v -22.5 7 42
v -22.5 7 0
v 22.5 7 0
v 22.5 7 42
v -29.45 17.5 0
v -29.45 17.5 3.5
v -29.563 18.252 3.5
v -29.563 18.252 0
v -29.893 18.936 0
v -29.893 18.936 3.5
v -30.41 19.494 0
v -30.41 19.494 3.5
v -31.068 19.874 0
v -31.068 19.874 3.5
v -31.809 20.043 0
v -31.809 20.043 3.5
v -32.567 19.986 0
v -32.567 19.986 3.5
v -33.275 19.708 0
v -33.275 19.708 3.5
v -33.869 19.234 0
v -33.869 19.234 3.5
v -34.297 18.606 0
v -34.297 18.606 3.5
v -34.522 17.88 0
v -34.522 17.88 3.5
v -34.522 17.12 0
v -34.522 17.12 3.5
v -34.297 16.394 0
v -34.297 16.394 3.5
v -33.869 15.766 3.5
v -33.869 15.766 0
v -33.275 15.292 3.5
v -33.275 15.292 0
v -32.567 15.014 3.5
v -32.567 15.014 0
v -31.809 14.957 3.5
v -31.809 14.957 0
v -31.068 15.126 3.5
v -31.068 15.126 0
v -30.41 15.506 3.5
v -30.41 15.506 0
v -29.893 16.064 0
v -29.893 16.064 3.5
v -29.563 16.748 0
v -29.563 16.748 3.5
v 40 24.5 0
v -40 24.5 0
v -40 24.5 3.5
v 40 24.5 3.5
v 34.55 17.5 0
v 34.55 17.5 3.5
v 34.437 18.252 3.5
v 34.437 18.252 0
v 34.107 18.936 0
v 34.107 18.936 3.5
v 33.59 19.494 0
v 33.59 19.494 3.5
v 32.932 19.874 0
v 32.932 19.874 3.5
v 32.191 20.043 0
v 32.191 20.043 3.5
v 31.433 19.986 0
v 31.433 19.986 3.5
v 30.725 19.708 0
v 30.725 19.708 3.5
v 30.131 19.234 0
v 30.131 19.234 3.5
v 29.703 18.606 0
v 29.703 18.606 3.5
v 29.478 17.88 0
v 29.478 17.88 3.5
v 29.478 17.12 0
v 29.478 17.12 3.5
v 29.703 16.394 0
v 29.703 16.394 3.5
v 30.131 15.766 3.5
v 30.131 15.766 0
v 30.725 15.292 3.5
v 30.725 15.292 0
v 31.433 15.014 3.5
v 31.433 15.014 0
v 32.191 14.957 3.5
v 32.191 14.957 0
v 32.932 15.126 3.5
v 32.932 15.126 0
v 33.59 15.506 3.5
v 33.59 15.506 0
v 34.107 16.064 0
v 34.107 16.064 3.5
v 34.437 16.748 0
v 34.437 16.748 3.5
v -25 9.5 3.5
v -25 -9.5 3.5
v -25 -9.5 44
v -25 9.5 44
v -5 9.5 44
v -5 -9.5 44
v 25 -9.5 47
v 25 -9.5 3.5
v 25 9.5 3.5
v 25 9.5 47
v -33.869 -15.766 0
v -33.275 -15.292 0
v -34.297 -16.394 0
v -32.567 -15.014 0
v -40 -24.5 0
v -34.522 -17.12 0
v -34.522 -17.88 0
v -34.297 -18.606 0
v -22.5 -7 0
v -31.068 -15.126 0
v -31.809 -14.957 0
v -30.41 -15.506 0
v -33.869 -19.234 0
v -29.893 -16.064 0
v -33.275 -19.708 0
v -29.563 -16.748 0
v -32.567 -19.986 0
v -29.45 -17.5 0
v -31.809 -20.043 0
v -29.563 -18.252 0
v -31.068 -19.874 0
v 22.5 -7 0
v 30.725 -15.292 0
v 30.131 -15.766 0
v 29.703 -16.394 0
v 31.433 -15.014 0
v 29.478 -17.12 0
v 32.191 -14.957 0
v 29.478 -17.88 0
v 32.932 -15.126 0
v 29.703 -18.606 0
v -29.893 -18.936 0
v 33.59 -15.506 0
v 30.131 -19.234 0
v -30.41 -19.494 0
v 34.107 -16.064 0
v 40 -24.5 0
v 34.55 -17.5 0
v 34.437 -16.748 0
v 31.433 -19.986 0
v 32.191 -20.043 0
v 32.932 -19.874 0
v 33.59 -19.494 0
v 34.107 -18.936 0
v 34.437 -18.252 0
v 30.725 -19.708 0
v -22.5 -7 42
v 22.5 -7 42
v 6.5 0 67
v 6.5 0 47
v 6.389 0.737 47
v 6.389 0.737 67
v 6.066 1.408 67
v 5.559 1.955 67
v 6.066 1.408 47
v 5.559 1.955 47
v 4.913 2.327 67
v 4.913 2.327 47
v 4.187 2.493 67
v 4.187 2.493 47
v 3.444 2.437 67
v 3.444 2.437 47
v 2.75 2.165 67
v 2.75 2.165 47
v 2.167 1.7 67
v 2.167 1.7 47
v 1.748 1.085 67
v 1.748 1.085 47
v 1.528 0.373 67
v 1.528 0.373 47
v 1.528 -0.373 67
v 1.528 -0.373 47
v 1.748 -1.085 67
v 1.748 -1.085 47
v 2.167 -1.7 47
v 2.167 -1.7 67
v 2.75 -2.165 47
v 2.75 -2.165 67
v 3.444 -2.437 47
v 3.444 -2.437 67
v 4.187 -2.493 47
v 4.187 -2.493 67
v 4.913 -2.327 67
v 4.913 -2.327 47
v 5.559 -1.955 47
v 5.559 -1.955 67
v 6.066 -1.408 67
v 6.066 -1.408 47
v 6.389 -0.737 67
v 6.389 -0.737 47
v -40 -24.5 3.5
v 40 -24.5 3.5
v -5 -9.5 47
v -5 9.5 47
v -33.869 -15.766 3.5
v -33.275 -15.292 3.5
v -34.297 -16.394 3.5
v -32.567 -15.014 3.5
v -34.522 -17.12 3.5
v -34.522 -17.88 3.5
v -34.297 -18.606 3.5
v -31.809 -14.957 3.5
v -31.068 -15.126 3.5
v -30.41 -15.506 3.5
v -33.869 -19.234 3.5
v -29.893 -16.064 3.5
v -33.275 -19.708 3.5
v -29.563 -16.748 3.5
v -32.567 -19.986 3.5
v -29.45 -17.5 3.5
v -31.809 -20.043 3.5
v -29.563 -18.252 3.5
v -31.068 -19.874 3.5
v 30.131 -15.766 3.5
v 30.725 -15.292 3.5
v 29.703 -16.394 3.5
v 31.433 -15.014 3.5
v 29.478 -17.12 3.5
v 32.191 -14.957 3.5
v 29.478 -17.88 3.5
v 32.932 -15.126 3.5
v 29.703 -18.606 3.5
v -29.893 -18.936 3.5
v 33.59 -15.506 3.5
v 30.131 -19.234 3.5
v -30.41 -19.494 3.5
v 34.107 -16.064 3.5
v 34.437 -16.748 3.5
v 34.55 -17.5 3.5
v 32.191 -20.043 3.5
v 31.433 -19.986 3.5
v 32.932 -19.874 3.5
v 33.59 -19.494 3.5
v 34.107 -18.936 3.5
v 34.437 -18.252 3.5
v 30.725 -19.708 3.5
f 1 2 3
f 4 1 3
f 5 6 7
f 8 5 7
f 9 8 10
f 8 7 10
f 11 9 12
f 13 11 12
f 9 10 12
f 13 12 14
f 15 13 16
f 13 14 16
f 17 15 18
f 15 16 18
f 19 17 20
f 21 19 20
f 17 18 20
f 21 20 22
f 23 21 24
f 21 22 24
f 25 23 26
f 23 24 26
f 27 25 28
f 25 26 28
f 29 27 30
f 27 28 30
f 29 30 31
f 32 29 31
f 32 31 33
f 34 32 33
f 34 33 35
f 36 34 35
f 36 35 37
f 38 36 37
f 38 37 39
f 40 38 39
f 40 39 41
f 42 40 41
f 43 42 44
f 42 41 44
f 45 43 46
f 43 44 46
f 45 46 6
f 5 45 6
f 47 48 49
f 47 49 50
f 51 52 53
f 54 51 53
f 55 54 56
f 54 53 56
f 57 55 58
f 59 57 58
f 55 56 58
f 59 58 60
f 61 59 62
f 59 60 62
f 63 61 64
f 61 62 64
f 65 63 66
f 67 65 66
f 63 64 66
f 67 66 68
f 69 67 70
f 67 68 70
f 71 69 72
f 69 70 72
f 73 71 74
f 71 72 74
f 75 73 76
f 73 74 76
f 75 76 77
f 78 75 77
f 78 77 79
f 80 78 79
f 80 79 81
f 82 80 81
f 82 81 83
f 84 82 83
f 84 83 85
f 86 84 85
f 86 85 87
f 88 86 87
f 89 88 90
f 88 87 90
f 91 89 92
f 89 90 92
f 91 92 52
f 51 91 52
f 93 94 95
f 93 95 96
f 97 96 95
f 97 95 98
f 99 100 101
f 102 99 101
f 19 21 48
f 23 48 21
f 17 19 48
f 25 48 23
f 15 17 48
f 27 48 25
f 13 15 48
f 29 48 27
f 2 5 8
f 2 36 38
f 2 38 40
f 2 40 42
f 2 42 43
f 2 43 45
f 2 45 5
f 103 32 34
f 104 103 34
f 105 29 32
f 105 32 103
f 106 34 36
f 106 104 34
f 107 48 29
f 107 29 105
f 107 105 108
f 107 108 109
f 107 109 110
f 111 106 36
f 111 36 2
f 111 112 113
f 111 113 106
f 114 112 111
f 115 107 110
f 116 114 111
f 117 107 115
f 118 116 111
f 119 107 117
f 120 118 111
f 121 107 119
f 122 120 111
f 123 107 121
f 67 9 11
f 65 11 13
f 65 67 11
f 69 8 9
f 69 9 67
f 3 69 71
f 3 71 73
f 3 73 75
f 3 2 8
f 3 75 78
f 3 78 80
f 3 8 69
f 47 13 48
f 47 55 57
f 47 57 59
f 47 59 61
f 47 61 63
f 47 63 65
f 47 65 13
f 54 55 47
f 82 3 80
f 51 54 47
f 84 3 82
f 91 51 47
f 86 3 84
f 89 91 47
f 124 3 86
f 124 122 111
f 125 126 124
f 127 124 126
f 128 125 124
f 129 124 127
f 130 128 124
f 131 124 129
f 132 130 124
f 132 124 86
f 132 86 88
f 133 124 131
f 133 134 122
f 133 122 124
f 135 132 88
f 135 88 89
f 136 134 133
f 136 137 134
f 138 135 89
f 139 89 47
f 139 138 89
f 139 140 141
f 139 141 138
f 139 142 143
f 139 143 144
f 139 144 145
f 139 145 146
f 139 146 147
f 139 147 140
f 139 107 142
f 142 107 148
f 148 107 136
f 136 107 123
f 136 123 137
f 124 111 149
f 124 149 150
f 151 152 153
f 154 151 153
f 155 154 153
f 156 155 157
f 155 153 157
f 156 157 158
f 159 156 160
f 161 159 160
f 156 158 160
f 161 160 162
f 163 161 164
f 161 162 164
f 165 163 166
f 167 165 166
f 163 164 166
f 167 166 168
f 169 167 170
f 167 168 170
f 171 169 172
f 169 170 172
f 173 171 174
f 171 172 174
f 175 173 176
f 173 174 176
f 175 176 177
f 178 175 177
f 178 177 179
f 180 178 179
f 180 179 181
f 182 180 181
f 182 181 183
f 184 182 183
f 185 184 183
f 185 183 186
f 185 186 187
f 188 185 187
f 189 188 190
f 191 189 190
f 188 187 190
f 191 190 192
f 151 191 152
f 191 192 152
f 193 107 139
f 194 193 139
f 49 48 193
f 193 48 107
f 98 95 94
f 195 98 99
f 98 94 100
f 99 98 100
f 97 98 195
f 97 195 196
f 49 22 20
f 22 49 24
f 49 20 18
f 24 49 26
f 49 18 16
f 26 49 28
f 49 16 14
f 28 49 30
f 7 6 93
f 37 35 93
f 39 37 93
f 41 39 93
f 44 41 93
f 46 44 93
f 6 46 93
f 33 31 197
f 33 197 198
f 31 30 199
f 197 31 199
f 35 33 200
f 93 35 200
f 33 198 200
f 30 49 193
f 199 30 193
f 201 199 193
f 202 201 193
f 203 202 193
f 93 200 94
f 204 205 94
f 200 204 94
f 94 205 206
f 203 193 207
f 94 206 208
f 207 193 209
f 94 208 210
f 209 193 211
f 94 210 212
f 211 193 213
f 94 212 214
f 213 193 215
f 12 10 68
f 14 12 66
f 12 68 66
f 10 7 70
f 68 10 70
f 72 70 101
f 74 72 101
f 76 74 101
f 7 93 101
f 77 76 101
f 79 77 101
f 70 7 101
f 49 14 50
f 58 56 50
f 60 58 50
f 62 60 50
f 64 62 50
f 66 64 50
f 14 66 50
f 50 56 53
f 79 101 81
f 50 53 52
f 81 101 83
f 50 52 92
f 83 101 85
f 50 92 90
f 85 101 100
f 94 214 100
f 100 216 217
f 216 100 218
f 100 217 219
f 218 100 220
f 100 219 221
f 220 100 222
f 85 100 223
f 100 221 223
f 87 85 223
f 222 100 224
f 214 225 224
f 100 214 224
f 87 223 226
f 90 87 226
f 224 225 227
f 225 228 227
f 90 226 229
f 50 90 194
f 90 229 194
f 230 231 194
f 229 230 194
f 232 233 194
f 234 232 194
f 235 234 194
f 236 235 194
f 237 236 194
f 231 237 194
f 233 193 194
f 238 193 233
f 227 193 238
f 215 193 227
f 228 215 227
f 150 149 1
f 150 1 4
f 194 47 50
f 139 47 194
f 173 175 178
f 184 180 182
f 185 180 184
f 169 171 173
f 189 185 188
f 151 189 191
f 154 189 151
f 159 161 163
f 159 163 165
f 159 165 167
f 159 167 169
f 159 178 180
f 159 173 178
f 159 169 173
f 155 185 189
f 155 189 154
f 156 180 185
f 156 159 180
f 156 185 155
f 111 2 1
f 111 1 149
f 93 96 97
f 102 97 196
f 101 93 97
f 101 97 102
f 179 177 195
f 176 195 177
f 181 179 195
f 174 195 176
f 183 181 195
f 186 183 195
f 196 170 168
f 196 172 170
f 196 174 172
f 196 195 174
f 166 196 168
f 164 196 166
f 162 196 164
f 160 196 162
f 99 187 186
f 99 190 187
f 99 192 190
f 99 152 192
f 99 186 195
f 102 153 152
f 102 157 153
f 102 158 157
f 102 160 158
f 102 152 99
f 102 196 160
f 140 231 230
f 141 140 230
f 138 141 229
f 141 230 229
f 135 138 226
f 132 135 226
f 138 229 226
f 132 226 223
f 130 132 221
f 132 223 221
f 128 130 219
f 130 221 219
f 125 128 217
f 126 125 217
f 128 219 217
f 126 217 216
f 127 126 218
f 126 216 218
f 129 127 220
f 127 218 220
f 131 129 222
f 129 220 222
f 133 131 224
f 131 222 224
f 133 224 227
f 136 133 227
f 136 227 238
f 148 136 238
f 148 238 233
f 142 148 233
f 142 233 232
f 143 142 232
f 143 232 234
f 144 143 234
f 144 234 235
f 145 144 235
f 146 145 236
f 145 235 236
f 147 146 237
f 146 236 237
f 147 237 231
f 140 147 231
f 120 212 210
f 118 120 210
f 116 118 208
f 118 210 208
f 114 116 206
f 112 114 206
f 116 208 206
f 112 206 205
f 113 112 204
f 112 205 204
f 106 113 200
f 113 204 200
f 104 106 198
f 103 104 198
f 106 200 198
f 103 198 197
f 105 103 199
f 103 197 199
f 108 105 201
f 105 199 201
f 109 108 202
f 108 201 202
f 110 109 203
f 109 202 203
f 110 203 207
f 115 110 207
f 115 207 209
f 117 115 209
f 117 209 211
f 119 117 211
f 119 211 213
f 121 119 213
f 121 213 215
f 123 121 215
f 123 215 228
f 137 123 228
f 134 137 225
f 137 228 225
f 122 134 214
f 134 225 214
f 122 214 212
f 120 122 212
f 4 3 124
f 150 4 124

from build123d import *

# Parameters (mm, degrees)
F0_W      = 50
F0_H      = 19
F1_DEPTH  = 44
F2_W      = 30
F2_H      = 19
F3_DEPTH  = 3
F4_R      = 2.5
F5_DEPTH  = 20
F6_W      = 80
F6_H      = 49
F7_DEPTH  = 3.5
F8_R      = 2.55
F9_DEPTH  = 3.5
F10_W     = 45
F10_H     = 14
F11_DEPTH = 42


with BuildPart() as f1:
    # F0 (on Top) → F1 (new body)
    with BuildSketch(Plane.XY):
        Rectangle(F0_W, F0_H)
    extrude(amount=F1_DEPTH)

    # F2 (on face) → F3 (join)
    with BuildSketch(Plane.XY.offset(44)):
        with Locations((10, 0)):
            Rectangle(F2_W, F2_H)
    extrude(amount=F3_DEPTH)

    # F4 (on face) → F5 (join)
    with BuildSketch(Plane.XY.offset(47)):
        with Locations((4, 0)):
            Circle(F4_R)
    extrude(amount=F5_DEPTH)

    # F6 (on face) → F7 (join)
    with BuildSketch(Plane(origin=(0, 0, 0), x_dir=(1, 0, 0), z_dir=(0, 0, -1))):
        Rectangle(F6_W, F6_H)
    extrude(amount=-F7_DEPTH)

    # F8 (on face) → F9 (cut, through all)
    with BuildSketch(Plane.XY.offset(3.5)):
        with Locations((-32, 17.5)):
            Circle(F8_R)
        with Locations((32, 17.5)):
            Circle(F8_R)
        with Locations((-32, -17.5)):
            Circle(F8_R)
        with Locations((32, -17.5)):
            Circle(F8_R)
    extrude(amount=-F9_DEPTH, mode=Mode.SUBTRACT)

    # F10 (on face) → F11 (cut)
    with BuildSketch(Plane(origin=(0, 0, 0), x_dir=(1, 0, 0), z_dir=(0, 0, -1))):
        Rectangle(F10_W, F10_H)
    extrude(amount=-F11_DEPTH, mode=Mode.SUBTRACT)


solid = f1.part
